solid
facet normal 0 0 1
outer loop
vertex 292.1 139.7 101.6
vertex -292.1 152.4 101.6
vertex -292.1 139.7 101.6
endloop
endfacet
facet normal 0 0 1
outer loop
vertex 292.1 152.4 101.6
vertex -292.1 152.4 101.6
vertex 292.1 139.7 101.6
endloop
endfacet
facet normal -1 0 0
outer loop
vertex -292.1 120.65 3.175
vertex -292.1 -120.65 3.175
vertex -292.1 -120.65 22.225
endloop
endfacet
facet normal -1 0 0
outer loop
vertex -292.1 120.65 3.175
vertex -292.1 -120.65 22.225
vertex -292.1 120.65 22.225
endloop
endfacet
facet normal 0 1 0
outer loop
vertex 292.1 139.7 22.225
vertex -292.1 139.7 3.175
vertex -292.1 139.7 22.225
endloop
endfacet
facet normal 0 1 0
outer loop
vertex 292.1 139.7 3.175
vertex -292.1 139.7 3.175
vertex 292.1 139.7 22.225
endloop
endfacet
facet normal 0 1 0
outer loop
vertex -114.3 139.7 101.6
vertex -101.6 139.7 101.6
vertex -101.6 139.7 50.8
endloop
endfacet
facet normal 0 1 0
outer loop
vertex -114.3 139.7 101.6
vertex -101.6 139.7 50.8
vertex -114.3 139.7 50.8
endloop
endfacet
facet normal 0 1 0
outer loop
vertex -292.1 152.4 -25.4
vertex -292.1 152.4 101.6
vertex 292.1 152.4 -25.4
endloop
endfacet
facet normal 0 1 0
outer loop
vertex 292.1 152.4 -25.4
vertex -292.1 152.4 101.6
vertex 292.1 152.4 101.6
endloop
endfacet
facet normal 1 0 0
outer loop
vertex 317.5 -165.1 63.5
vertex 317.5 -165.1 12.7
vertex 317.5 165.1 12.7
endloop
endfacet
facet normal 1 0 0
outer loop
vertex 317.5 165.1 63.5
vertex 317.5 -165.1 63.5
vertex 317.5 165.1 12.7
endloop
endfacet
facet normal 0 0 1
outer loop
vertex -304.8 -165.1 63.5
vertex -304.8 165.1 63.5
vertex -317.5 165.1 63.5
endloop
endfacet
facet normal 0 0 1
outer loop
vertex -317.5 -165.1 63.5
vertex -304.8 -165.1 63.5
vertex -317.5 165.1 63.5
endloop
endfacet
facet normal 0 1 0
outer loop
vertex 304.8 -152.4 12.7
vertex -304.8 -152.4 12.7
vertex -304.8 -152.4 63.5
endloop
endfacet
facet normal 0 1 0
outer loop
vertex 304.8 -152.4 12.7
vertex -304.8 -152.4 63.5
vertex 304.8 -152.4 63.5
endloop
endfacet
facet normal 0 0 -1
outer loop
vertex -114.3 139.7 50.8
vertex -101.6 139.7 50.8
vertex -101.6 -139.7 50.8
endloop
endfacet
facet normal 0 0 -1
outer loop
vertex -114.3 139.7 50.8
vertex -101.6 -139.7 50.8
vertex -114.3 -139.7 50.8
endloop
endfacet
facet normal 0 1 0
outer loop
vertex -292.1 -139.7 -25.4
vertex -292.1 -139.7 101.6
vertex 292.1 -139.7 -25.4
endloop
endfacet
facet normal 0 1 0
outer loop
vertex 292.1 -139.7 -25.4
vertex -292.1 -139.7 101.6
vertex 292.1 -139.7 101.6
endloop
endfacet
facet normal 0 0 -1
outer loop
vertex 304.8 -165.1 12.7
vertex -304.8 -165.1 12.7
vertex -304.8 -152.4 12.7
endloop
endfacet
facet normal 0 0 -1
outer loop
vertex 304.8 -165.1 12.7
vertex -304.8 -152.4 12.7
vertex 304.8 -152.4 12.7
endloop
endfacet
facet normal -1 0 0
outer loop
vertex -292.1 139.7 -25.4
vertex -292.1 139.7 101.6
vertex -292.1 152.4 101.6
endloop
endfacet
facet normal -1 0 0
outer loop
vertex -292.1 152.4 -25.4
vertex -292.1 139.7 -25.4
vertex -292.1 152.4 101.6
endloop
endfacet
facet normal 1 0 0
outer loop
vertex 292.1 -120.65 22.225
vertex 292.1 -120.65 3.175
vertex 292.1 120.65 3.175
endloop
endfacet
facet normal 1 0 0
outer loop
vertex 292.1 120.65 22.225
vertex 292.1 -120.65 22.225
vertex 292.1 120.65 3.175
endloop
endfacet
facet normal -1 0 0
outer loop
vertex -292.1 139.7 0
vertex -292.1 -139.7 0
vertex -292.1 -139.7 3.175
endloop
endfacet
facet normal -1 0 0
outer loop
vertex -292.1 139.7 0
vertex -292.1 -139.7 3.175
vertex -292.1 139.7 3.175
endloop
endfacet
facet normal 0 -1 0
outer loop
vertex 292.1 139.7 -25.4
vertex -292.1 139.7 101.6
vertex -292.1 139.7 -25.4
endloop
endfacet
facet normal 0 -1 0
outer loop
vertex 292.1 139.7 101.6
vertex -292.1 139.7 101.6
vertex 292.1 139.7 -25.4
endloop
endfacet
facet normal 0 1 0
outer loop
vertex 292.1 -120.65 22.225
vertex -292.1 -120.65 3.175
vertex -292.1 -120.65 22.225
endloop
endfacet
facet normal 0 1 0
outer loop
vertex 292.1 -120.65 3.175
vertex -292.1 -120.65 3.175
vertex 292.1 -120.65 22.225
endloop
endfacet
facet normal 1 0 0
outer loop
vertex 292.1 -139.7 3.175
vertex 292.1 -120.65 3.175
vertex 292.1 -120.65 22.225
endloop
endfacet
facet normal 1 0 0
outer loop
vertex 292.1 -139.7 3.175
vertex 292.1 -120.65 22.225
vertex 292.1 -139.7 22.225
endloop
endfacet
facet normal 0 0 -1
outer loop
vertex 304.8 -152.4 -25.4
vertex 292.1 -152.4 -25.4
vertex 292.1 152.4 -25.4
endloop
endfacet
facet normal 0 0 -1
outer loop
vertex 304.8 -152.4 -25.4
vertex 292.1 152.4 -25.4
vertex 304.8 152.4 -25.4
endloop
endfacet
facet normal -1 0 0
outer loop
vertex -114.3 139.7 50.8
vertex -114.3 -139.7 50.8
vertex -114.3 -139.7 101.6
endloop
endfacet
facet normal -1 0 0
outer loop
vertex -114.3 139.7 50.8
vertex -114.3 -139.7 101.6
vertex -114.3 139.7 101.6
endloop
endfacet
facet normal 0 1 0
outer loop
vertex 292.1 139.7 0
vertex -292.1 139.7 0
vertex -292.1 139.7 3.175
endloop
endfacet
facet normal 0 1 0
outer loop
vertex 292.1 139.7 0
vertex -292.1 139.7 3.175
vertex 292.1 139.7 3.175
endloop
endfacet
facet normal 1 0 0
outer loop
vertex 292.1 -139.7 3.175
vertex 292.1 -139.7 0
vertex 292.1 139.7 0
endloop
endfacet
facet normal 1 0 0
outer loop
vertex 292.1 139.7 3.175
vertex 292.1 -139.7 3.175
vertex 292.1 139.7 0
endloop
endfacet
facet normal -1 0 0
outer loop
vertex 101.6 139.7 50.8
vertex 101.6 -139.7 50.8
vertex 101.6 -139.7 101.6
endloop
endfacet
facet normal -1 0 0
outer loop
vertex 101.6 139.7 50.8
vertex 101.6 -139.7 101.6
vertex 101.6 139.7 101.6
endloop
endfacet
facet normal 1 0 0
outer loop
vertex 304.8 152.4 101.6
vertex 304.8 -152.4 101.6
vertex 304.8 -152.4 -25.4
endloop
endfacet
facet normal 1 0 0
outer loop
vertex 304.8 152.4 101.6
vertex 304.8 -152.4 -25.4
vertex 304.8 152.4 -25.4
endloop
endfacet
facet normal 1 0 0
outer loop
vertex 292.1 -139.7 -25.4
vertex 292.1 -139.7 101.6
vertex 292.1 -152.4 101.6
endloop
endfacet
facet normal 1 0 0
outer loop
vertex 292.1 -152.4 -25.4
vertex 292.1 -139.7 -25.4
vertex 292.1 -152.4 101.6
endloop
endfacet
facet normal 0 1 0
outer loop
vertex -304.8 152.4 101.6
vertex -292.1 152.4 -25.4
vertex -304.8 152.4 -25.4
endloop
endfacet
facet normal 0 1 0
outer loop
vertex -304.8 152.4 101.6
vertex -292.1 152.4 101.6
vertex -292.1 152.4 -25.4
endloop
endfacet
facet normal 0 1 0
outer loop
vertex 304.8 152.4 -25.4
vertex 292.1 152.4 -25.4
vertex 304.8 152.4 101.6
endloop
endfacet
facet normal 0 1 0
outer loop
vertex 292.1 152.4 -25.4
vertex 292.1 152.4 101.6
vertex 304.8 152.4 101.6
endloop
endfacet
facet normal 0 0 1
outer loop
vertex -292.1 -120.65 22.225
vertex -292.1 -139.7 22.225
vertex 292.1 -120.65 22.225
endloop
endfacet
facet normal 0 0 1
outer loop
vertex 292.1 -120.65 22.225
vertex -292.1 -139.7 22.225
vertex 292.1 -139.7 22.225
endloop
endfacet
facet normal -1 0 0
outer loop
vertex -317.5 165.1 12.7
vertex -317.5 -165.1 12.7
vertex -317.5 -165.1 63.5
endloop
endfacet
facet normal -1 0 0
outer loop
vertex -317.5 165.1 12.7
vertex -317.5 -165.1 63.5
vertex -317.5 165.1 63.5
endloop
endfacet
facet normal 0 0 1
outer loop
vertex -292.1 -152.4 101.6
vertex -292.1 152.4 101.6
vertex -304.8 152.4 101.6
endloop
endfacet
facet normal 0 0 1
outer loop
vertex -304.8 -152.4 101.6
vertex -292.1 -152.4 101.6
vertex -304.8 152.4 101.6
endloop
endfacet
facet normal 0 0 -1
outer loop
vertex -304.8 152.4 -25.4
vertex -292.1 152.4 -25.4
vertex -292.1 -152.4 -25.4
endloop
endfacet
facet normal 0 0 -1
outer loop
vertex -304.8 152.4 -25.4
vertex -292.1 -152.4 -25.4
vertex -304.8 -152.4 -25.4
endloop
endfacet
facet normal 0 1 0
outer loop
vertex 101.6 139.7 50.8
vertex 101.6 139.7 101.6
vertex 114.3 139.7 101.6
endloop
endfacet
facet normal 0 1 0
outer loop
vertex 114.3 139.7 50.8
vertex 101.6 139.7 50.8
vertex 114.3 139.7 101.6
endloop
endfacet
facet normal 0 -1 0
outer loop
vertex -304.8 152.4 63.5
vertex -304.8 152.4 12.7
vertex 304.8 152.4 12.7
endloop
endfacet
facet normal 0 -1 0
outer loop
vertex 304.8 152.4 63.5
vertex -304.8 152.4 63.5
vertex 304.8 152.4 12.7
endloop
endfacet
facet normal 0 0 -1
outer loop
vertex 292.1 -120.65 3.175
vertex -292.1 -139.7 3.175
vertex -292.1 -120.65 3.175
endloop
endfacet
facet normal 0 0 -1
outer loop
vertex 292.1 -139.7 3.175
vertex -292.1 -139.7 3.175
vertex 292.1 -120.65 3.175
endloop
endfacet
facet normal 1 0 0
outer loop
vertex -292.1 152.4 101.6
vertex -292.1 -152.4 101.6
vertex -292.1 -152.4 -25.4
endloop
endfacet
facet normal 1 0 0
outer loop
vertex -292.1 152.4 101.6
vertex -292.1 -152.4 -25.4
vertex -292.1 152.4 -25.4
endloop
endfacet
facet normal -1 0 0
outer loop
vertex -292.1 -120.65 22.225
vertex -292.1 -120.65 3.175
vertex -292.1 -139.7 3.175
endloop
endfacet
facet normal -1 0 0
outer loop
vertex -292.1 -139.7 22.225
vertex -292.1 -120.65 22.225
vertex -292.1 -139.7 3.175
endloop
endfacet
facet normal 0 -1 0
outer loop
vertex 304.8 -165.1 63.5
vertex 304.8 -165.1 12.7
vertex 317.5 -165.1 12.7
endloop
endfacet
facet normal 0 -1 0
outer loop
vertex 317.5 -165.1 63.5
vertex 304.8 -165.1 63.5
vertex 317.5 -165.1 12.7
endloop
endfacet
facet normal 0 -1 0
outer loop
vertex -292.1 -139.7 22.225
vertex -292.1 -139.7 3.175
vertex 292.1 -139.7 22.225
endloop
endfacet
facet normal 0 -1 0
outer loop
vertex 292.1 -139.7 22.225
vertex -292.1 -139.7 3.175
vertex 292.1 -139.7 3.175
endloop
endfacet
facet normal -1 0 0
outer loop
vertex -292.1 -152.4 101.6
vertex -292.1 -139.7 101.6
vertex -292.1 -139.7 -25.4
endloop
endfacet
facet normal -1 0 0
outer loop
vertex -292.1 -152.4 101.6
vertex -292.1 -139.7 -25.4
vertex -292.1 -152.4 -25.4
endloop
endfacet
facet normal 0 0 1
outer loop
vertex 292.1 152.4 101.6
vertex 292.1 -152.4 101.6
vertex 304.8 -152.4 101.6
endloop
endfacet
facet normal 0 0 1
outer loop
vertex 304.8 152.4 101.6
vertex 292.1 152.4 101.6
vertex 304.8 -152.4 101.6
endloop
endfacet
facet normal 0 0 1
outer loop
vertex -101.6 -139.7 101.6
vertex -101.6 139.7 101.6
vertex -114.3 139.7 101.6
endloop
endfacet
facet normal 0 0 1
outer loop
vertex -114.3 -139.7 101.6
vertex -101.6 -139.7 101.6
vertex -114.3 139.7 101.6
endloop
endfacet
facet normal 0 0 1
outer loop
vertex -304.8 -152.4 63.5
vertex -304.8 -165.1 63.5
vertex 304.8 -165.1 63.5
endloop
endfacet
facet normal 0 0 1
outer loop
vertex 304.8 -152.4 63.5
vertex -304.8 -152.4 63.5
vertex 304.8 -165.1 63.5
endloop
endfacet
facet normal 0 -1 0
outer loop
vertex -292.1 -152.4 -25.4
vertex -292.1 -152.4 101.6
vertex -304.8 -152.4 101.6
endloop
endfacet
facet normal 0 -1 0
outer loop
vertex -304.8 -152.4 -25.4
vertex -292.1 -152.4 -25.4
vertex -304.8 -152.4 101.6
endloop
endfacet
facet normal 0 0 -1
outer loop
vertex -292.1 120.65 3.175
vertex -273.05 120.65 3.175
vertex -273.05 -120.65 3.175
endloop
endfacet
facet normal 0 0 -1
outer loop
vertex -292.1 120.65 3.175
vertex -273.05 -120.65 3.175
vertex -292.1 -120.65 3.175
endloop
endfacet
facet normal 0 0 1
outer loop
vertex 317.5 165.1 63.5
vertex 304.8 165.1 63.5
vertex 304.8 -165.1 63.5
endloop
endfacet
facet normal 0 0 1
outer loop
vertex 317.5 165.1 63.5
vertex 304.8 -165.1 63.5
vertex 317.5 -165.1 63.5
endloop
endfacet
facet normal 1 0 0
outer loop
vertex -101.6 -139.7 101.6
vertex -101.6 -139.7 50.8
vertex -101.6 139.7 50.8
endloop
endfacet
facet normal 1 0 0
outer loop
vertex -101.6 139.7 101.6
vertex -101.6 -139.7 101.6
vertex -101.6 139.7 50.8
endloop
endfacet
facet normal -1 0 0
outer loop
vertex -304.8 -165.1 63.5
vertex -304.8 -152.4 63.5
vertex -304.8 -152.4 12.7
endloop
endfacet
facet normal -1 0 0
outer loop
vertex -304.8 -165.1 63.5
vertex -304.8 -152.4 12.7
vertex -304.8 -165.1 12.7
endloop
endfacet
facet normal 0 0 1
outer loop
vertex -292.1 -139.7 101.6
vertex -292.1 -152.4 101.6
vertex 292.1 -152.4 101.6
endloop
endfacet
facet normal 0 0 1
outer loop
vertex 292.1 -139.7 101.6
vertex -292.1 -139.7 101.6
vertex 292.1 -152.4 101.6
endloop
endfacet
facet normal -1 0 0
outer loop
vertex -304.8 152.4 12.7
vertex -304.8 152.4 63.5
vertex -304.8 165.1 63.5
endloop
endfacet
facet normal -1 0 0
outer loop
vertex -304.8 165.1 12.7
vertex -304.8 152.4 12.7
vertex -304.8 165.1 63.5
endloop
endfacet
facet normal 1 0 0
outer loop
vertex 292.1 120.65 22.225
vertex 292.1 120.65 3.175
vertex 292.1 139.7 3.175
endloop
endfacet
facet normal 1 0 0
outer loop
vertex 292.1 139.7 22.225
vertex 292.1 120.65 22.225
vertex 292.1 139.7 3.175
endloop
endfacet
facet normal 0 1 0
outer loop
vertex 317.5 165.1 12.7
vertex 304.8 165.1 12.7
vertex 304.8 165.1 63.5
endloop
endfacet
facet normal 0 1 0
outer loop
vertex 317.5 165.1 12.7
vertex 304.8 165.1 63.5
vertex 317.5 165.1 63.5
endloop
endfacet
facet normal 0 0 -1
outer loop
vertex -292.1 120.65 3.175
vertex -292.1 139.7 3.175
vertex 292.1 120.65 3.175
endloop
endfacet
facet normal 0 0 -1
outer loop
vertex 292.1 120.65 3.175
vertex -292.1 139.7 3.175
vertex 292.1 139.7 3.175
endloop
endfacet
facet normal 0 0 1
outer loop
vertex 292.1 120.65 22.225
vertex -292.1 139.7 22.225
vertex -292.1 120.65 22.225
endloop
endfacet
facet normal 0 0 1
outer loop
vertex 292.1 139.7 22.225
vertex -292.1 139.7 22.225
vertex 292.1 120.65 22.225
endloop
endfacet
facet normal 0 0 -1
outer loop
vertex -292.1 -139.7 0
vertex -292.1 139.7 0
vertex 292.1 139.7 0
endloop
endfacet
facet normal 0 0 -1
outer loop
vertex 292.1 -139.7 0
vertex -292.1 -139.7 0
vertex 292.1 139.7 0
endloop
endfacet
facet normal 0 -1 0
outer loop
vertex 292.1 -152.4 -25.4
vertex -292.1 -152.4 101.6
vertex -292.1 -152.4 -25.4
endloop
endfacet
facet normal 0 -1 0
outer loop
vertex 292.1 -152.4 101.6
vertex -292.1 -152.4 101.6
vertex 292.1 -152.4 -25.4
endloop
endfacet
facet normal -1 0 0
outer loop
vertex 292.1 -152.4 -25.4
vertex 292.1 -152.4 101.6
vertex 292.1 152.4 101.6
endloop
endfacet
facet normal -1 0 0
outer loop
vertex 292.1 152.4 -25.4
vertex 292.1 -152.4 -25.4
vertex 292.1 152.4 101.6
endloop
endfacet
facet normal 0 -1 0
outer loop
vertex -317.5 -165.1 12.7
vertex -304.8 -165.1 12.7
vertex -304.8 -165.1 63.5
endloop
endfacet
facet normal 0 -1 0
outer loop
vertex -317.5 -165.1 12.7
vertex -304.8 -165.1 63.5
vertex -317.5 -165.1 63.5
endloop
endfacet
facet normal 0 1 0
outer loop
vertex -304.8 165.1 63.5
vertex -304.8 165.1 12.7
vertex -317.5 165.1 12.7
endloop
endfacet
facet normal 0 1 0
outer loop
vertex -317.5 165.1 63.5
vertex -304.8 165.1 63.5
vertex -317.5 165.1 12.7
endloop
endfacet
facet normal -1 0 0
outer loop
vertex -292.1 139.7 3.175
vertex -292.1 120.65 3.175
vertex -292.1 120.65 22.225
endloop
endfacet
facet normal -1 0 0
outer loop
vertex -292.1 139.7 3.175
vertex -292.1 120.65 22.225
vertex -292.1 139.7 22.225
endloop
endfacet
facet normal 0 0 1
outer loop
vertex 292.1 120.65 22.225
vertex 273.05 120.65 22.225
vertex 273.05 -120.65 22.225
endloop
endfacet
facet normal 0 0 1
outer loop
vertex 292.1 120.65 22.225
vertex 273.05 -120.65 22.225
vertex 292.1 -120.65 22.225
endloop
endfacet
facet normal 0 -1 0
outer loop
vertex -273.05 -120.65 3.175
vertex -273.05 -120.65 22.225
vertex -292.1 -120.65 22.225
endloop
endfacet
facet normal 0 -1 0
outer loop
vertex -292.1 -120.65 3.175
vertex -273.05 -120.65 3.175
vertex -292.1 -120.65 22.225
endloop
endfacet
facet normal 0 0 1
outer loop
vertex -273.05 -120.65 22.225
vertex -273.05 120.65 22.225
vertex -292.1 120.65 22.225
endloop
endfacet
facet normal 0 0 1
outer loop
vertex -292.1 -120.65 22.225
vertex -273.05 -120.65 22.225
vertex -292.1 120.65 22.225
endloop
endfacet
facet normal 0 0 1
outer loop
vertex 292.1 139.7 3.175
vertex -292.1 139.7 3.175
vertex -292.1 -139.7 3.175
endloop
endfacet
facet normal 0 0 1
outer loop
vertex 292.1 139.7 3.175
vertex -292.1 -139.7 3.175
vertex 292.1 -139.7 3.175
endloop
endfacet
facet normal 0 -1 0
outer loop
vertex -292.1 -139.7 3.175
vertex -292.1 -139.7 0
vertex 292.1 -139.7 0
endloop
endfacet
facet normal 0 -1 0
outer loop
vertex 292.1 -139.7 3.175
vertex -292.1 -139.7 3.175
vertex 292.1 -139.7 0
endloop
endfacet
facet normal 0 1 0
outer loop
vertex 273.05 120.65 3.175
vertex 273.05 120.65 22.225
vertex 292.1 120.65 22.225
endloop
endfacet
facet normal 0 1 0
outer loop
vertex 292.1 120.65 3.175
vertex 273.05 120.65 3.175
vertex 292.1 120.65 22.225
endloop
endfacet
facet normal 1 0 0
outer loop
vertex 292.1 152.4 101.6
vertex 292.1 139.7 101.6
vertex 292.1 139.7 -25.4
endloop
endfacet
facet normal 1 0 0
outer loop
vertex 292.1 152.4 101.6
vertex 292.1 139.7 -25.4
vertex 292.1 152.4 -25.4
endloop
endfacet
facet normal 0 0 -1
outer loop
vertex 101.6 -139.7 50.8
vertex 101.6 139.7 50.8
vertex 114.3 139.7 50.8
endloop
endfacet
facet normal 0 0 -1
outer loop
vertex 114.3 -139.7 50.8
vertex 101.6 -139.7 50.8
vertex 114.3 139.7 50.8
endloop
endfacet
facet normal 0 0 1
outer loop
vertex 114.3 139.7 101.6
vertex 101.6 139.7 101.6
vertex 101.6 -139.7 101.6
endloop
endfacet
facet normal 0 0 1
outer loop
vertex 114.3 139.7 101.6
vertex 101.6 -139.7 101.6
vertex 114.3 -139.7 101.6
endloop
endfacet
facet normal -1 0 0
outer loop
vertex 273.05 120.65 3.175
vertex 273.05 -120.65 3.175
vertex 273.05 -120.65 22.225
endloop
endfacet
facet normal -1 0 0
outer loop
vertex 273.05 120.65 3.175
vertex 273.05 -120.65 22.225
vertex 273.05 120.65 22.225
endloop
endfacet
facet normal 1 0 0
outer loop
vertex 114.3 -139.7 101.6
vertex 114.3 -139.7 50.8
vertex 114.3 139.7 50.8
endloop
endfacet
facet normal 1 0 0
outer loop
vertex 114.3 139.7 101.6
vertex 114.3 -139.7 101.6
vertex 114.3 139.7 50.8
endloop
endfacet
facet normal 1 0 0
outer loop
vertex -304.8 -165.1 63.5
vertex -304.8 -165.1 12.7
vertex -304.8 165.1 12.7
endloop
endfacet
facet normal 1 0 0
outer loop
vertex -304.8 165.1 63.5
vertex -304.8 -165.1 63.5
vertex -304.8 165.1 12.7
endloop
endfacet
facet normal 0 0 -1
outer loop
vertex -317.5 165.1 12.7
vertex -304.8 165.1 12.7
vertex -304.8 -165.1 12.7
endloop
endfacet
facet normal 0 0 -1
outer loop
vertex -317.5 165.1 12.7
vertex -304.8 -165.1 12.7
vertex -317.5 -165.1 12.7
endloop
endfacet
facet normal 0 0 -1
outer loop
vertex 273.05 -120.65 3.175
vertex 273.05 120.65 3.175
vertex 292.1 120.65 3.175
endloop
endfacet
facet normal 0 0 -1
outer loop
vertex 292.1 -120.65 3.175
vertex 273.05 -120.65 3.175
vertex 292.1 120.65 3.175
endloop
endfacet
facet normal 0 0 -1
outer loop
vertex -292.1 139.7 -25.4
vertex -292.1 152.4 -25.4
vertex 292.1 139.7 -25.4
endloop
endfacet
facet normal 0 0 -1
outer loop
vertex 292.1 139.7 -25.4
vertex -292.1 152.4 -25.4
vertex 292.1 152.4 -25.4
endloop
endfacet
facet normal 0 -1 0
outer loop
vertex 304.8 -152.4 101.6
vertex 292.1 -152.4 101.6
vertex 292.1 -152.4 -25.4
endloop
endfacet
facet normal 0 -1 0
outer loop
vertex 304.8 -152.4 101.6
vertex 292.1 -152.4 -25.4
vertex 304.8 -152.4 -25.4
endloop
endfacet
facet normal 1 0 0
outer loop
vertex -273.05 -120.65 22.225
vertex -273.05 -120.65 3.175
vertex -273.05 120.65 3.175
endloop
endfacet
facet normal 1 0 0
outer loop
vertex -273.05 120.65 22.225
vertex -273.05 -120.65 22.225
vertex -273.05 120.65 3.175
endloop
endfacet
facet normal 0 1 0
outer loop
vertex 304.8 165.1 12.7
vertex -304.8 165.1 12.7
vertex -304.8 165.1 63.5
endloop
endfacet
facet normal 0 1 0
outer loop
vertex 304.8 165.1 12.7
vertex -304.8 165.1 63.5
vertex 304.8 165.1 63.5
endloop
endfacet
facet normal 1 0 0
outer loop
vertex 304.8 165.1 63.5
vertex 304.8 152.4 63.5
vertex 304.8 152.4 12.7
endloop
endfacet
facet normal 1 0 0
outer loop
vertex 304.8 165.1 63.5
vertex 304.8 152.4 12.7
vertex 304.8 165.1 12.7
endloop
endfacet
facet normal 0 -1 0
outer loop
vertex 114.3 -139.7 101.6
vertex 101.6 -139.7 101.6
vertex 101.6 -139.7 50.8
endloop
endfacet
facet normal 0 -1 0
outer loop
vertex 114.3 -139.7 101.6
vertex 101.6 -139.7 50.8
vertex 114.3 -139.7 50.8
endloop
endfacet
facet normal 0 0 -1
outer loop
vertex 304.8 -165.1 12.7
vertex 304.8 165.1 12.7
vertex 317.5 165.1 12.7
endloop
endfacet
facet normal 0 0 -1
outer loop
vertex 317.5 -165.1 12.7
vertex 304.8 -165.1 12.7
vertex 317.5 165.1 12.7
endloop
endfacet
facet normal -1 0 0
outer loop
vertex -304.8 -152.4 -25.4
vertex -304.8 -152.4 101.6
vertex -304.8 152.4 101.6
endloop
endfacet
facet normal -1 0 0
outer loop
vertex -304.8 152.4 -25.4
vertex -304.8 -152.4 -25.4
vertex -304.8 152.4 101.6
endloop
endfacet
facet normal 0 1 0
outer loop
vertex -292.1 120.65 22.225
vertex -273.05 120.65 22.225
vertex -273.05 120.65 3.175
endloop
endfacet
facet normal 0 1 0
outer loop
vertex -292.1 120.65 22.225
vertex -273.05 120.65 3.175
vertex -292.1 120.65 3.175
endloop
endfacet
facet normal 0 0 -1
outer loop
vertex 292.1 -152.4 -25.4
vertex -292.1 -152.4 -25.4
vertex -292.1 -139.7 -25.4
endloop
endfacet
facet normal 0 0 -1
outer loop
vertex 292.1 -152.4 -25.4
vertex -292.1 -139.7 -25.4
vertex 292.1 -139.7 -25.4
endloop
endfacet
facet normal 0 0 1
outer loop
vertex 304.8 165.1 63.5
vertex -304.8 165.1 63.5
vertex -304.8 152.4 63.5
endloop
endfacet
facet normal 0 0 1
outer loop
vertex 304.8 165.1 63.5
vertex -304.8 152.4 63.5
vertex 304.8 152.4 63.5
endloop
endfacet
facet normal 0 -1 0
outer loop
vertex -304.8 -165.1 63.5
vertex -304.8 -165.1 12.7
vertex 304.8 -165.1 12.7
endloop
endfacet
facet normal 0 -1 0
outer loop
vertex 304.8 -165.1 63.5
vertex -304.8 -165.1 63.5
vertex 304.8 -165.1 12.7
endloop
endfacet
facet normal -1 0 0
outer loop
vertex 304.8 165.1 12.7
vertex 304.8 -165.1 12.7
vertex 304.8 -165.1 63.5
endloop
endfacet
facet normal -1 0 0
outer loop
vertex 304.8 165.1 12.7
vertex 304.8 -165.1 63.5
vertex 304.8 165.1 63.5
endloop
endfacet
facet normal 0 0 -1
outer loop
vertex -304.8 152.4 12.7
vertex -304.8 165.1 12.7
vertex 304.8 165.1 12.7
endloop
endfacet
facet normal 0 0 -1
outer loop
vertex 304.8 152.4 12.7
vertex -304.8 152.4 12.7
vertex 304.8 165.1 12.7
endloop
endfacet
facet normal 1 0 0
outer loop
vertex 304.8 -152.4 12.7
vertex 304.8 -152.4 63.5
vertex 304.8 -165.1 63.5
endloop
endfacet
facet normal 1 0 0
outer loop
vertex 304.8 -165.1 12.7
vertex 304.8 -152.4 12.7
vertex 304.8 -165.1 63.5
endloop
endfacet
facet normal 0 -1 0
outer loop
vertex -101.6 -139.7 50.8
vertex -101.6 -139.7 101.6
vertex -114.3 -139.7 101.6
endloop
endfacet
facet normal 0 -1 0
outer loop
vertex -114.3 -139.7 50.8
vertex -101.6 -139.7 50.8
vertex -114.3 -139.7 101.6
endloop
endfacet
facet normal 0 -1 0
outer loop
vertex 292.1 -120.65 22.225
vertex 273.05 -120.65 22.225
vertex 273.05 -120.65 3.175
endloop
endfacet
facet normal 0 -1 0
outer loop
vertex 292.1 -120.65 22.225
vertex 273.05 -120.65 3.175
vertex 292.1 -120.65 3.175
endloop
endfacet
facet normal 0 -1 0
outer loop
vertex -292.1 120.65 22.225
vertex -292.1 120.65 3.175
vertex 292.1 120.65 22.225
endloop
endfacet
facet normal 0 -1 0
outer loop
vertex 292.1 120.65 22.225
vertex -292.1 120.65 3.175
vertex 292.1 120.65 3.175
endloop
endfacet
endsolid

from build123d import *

# Parameters (mm, degrees)
F0_W          = 584.2
F0_H          = 279.4
F1_DEPTH      = 3.175
F2_W          = 584.2
F2_H          = 12.7
F3_DEPTH      = 101.6
F3_DEPTH_BACK = 25.4
F5_W          = 12.7
F5_H          = 304.8
F6_DEPTH      = 101.6
F6_DEPTH_BACK = 25.4
F9_START      = 12.7
F8_W          = 609.6
F8_H          = 12.7
F9_DEPTH      = 50.8
F12_START     = 12.7
F11_W         = 12.7
F11_H         = 330.2
F12_DEPTH     = 50.8
F15_START     = 50.8
F14_W         = 12.7
F14_H         = 279.4
F15_DEPTH     = 50.8
F18_START     = 3.175
F17_W         = 584.2
F17_H         = 19.05
F18_DEPTH     = 19.05
F21_START     = 3.175
F20_W         = 19.05
F20_H         = 241.3
F21_DEPTH     = 19.05


with BuildPart() as f1:
    # F0 (on Top) → F1 (new body)
    with BuildSketch(Plane.XY):
        Rectangle(F0_W, F0_H)
    extrude(amount=F1_DEPTH)


with BuildPart() as f3:
    # F2 (on Top) → F3 (new body, two sides)
    with BuildSketch(Plane.XY) as f3_sk:
        with Locations((0, 146.05)):
            Rectangle(F2_W, F2_H)
    extrude(amount=F3_DEPTH)
    extrude(f3_sk.sketch, amount=-F3_DEPTH_BACK)


with BuildPart() as f4_1:
    # F4: instance of F3
    add(f3.part.mirror(Plane.XZ))


with BuildPart() as f6:
    # F5 (on Top) → F6 (new body, two sides)
    with BuildSketch(Plane.XY) as f6_sk:
        with Locations((298.45, 0)):
            Rectangle(F5_W, F5_H)
    extrude(amount=F6_DEPTH)
    extrude(f6_sk.sketch, amount=-F6_DEPTH_BACK)


with BuildPart() as f7_1:
    # F7: instance of F6
    add(f6.part.mirror(Plane.YZ))


with BuildPart() as f9:
    # F8 (on Top) → F9 (new body)
    with BuildSketch(Plane.XY.offset(F9_START)):
        with Locations((0, 158.75)):
            Rectangle(F8_W, F8_H)
    extrude(amount=F9_DEPTH)


with BuildPart() as f10_1:
    # F10: instance of F9
    add(f9.part.mirror(Plane.XZ))


with BuildPart() as f12:
    # F11 (on Top) → F12 (new body)
    with BuildSketch(Plane.XY.offset(F12_START)):
        with Locations((311.15, 0)):
            Rectangle(F11_W, F11_H)
    extrude(amount=F12_DEPTH)


with BuildPart() as f13_1:
    # F13: instance of F12
    add(f12.part.mirror(Plane.YZ))


with BuildPart() as f15:
    # F14 (on Top) → F15 (new body)
    with BuildSketch(Plane.XY.offset(F15_START)):
        with Locations((107.95, 0)):
            Rectangle(F14_W, F14_H)
    extrude(amount=F15_DEPTH)


with BuildPart() as f16_1:
    # F16: instance of F15
    add(f15.part.mirror(Plane.YZ))


with BuildPart() as f18:
    # F17 (on Top) → F18 (new body)
    with BuildSketch(Plane.XY.offset(F18_START)):
        with Locations((0, 130.175)):
            Rectangle(F17_W, F17_H)
    extrude(amount=F18_DEPTH)


with BuildPart() as f19_1:
    # F19: instance of F18
    add(f18.part.mirror(Plane.XZ))


with BuildPart() as f21:
    # F20 (on Top) → F21 (new body)
    with BuildSketch(Plane.XY.offset(F21_START)):
        with Locations((282.575, 0)):
            Rectangle(F20_W, F20_H)
    extrude(amount=F21_DEPTH)


with BuildPart() as f22_1:
    # F22: instance of F21
    add(f21.part.mirror(Plane.YZ))


solid = Compound([f1.part, f3.part, f4_1.part, f6.part, f7_1.part, f9.part, f10_1.part, f12.part, f13_1.part, f15.part, f16_1.part, f18.part, f19_1.part, f21.part, f22_1.part])
